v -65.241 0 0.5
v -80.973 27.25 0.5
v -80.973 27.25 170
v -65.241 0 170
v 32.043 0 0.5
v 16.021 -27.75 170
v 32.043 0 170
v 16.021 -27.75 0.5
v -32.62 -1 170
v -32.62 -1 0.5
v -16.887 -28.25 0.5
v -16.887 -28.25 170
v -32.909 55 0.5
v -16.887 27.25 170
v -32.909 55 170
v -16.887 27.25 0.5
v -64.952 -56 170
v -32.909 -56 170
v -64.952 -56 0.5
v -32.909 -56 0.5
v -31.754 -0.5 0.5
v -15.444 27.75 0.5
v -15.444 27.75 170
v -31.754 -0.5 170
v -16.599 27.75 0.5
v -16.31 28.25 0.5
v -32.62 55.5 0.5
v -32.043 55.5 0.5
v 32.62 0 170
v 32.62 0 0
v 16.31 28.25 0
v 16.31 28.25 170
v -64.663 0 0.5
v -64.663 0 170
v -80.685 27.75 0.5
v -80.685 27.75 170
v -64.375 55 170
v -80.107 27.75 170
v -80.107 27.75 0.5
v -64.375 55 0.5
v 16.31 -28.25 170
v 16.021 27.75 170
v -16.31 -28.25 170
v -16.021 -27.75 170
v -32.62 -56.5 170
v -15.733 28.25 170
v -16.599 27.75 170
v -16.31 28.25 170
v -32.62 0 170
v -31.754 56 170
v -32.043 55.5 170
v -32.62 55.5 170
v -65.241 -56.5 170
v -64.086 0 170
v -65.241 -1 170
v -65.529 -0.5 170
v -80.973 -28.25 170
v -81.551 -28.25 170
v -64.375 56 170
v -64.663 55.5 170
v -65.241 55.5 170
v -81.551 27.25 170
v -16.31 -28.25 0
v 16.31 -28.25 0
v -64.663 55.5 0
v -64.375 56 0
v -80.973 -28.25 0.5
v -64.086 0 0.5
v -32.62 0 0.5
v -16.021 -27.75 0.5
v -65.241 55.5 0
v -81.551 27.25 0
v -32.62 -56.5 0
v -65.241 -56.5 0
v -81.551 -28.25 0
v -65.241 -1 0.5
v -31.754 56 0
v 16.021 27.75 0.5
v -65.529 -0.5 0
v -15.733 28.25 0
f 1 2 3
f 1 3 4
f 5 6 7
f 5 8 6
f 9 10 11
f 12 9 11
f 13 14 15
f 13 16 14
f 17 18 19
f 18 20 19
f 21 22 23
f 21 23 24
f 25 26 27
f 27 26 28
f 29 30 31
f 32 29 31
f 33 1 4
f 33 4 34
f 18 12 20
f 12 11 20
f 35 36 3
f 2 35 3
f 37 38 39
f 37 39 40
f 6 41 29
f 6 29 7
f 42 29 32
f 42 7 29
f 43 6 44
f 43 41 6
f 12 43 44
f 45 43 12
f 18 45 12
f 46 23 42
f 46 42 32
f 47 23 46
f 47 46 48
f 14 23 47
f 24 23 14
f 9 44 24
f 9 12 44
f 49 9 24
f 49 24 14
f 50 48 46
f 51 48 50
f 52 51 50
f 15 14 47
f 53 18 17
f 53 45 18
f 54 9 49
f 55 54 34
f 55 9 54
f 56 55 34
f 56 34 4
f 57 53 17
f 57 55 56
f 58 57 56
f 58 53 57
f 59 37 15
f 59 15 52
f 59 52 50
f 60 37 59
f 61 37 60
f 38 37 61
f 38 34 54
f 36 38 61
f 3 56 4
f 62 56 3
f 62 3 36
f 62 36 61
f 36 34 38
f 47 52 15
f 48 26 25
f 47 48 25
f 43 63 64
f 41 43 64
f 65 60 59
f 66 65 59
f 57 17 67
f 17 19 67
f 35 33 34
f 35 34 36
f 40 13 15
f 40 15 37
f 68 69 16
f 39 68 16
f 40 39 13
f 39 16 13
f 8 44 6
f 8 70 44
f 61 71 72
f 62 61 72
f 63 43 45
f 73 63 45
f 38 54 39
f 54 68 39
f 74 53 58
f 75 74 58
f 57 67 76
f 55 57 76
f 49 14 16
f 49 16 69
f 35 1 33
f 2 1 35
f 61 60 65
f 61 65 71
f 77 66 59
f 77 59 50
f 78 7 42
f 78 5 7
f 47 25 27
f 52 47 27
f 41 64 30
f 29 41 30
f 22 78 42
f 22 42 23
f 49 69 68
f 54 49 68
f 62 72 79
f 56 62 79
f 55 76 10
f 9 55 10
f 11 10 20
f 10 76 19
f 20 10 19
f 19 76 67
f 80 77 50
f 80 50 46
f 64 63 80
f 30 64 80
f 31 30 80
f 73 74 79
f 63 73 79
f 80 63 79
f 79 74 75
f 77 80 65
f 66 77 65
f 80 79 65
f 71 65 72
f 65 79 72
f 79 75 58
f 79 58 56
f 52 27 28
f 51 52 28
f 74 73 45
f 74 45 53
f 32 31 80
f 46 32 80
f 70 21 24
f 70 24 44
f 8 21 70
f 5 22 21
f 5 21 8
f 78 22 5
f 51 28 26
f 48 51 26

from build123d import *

# Parameters (mm, degrees)
F1_DEPTH = 170
F2_T     = -0.5


# Not quite as in the source:
# - a feature names something its author has since deleted; it is built from what else it names


with BuildPart() as f1:
    # F0 (on Top) → F1 (new body)
    with BuildSketch(Plane.XY):
        Polygon((16.3101451046, 28.25), (-16.3101451046, 28.25), (-32.6202902092, 0), (-16.3101451046, -28.25), (16.3101451046, -28.25), (32.6202902092, 0), align=None)
    extrude(amount=F1_DEPTH)

    # F2
    f2_openings = [f1.faces().sort_by_distance(p)[0] for p in [
        (0, 0, 170),
    ]]
    offset(amount=F2_T, openings=f2_openings)

    # F3: F1 across face


with BuildPart() as f1_1:
    add(f1.part)
    add(f1.part.mirror(Plane(origin=(-24.032204955, 13.875, 85.25), x_dir=(0.5, 0.8660254038, 0), z_dir=(0.8660254038, -0.5, 0))))

    # F4: F1 across face


with BuildPart() as f1_2:
    add(f1_1.part)
    add(f1_1.part.mirror(Plane(origin=(-24.3208800896, -14.375, 85), x_dir=(0.5, -0.8660254038, 0), z_dir=(-0.8660254038, -0.5, 0))))


solid = f1_2.part
